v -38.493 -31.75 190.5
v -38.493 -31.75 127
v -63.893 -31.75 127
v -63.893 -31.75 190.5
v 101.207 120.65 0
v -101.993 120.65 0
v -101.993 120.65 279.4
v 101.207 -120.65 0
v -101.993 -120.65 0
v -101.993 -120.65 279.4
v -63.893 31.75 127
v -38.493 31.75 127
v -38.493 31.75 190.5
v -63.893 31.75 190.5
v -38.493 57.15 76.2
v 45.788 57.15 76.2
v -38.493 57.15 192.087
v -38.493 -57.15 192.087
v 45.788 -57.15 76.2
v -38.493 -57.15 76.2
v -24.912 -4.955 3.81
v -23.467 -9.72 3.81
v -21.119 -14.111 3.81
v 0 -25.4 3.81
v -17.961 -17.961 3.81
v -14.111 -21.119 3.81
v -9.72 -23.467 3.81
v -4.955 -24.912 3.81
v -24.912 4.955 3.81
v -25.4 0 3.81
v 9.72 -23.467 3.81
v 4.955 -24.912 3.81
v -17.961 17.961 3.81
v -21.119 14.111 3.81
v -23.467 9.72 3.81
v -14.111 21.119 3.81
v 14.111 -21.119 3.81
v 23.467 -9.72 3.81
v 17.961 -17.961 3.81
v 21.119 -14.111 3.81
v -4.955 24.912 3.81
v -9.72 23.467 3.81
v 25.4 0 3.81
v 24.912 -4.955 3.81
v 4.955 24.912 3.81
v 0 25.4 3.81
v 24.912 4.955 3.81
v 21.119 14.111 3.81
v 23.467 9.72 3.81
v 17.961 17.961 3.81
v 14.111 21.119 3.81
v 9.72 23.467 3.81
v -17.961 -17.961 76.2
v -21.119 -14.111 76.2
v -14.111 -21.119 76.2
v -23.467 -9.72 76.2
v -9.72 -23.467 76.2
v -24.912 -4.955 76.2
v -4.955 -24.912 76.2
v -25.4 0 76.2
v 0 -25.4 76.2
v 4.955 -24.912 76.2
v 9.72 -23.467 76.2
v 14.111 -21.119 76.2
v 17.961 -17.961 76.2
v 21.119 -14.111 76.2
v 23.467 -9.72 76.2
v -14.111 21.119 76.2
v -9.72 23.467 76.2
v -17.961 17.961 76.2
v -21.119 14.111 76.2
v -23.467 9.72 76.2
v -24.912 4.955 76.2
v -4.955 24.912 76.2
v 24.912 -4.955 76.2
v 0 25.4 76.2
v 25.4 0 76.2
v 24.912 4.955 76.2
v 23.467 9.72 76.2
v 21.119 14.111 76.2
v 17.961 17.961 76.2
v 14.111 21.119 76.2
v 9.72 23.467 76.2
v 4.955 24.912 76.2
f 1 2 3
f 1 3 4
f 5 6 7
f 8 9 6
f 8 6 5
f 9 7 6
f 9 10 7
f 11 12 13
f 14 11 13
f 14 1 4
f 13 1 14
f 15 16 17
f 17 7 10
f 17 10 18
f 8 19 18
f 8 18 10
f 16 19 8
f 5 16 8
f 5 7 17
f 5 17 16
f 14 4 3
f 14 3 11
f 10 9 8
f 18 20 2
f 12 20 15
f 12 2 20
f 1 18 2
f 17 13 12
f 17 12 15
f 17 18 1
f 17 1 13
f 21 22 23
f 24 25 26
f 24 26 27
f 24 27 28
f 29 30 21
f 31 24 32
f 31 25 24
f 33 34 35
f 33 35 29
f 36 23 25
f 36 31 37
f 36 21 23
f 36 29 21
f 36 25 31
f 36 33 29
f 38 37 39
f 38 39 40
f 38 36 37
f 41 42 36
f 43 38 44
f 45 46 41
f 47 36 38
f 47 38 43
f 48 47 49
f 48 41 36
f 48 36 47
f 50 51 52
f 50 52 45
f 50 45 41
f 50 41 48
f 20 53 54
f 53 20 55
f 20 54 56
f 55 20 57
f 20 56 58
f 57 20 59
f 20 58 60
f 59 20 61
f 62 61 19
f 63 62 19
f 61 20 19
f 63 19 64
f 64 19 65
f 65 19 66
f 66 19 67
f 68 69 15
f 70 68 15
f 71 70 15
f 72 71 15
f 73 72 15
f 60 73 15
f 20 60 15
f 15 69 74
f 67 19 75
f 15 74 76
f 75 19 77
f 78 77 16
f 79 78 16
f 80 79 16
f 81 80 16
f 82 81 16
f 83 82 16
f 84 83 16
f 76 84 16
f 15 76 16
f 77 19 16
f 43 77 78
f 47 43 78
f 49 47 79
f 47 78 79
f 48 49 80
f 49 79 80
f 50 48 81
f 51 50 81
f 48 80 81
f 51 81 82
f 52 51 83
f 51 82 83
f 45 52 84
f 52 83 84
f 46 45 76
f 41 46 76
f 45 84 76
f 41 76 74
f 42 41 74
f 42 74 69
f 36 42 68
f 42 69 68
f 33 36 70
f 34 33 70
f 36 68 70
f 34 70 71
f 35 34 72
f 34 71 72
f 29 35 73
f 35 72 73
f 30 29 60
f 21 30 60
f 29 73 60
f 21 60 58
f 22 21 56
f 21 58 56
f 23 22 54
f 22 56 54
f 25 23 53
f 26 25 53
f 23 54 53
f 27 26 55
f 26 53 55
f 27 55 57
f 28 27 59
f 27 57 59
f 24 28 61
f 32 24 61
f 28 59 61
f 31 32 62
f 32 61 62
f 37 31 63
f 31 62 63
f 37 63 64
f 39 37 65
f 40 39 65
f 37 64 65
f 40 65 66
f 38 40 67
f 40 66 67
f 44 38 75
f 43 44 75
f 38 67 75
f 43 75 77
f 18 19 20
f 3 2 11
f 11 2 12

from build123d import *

# Parameters (mm, degrees)
F1_DEPTH      = 120.65
F2_W          = 114.3
F2_H          = 139.7
F2_W_2        = 63.5
F2_H_2        = 63.5
F3_DEPTH      = 139.7
F4_DEPTH      = 165.1
F5_DEPTH      = 271.526
F5_DEPTH_BACK = 305.054
F6_DEPTH      = 87.122
F7_DEPTH      = 165.1
F8_R          = 25.4
F9_DEPTH      = 72.39


with BuildPart() as f1:
    # F0 (on Front) → F1 (new body, symmetric)
    with BuildSketch(Plane.XZ):
        Polygon((-101.9933745265, 279.4), (-101.9933745265, 0), (101.2066254735, 0), align=None)
        Polygon((-101.9933745265, 279.4), (101.2066254735, 0), (101.2066254735, 279.4), align=None)
    extrude(amount=F1_DEPTH, both=True)

    # F2 (on face) → F3 (cut)
    with BuildSketch(Plane.YZ.offset(101.2066254735)):
        with Locations((0, 146.05)):
            Rectangle(F2_W, F2_H)
        with Locations((0, 158.75)):
            Rectangle(F2_W_2, F2_H_2, mode=Mode.SUBTRACT)
        with Locations((0, 158.75)):
            Rectangle(F2_W_2, F2_H_2)
    extrude(amount=-F3_DEPTH, mode=Mode.SUBTRACT)

    # F2 (on face) → F4 (join)
    with BuildSketch(Plane.YZ.offset(101.2066254735)):
        with Locations((0, 158.75)):
            Rectangle(F2_W_2, F2_H_2)
    extrude(amount=-F4_DEPTH)

    # F0 (on Front) → F5 (cut, two sides)
    with BuildSketch(Plane.XZ) as f5_sk:
        Polygon((-101.9933745265, 279.4), (101.2066254735, 0), (101.2066254735, 279.4), align=None)
    extrude(amount=F5_DEPTH, mode=Mode.SUBTRACT)
    extrude(f5_sk.sketch, amount=-F5_DEPTH_BACK, mode=Mode.SUBTRACT)

    # F6 (cut): a face of the model
    f6_faces = [f1.faces().sort_by_distance(p)[0] for p in [
        (-22.7054235885, -31.75, 148.6706349206),
    ]]
    extrude(f6_faces, amount=-F6_DEPTH, mode=Mode.SUBTRACT)

    # F2 (on face) → F7 (cut)
    with BuildSketch(Plane.YZ.offset(101.2066254735)):
        with Locations((0, 158.75)):
            Rectangle(F2_W_2, F2_H_2)
    extrude(amount=-F7_DEPTH, mode=Mode.SUBTRACT)

    # F8 (on face) → F9 (cut)
    with BuildSketch(Plane.XY.offset(76.2)):
        Circle(F8_R)
    extrude(amount=-F9_DEPTH, mode=Mode.SUBTRACT)


solid = f1.part
